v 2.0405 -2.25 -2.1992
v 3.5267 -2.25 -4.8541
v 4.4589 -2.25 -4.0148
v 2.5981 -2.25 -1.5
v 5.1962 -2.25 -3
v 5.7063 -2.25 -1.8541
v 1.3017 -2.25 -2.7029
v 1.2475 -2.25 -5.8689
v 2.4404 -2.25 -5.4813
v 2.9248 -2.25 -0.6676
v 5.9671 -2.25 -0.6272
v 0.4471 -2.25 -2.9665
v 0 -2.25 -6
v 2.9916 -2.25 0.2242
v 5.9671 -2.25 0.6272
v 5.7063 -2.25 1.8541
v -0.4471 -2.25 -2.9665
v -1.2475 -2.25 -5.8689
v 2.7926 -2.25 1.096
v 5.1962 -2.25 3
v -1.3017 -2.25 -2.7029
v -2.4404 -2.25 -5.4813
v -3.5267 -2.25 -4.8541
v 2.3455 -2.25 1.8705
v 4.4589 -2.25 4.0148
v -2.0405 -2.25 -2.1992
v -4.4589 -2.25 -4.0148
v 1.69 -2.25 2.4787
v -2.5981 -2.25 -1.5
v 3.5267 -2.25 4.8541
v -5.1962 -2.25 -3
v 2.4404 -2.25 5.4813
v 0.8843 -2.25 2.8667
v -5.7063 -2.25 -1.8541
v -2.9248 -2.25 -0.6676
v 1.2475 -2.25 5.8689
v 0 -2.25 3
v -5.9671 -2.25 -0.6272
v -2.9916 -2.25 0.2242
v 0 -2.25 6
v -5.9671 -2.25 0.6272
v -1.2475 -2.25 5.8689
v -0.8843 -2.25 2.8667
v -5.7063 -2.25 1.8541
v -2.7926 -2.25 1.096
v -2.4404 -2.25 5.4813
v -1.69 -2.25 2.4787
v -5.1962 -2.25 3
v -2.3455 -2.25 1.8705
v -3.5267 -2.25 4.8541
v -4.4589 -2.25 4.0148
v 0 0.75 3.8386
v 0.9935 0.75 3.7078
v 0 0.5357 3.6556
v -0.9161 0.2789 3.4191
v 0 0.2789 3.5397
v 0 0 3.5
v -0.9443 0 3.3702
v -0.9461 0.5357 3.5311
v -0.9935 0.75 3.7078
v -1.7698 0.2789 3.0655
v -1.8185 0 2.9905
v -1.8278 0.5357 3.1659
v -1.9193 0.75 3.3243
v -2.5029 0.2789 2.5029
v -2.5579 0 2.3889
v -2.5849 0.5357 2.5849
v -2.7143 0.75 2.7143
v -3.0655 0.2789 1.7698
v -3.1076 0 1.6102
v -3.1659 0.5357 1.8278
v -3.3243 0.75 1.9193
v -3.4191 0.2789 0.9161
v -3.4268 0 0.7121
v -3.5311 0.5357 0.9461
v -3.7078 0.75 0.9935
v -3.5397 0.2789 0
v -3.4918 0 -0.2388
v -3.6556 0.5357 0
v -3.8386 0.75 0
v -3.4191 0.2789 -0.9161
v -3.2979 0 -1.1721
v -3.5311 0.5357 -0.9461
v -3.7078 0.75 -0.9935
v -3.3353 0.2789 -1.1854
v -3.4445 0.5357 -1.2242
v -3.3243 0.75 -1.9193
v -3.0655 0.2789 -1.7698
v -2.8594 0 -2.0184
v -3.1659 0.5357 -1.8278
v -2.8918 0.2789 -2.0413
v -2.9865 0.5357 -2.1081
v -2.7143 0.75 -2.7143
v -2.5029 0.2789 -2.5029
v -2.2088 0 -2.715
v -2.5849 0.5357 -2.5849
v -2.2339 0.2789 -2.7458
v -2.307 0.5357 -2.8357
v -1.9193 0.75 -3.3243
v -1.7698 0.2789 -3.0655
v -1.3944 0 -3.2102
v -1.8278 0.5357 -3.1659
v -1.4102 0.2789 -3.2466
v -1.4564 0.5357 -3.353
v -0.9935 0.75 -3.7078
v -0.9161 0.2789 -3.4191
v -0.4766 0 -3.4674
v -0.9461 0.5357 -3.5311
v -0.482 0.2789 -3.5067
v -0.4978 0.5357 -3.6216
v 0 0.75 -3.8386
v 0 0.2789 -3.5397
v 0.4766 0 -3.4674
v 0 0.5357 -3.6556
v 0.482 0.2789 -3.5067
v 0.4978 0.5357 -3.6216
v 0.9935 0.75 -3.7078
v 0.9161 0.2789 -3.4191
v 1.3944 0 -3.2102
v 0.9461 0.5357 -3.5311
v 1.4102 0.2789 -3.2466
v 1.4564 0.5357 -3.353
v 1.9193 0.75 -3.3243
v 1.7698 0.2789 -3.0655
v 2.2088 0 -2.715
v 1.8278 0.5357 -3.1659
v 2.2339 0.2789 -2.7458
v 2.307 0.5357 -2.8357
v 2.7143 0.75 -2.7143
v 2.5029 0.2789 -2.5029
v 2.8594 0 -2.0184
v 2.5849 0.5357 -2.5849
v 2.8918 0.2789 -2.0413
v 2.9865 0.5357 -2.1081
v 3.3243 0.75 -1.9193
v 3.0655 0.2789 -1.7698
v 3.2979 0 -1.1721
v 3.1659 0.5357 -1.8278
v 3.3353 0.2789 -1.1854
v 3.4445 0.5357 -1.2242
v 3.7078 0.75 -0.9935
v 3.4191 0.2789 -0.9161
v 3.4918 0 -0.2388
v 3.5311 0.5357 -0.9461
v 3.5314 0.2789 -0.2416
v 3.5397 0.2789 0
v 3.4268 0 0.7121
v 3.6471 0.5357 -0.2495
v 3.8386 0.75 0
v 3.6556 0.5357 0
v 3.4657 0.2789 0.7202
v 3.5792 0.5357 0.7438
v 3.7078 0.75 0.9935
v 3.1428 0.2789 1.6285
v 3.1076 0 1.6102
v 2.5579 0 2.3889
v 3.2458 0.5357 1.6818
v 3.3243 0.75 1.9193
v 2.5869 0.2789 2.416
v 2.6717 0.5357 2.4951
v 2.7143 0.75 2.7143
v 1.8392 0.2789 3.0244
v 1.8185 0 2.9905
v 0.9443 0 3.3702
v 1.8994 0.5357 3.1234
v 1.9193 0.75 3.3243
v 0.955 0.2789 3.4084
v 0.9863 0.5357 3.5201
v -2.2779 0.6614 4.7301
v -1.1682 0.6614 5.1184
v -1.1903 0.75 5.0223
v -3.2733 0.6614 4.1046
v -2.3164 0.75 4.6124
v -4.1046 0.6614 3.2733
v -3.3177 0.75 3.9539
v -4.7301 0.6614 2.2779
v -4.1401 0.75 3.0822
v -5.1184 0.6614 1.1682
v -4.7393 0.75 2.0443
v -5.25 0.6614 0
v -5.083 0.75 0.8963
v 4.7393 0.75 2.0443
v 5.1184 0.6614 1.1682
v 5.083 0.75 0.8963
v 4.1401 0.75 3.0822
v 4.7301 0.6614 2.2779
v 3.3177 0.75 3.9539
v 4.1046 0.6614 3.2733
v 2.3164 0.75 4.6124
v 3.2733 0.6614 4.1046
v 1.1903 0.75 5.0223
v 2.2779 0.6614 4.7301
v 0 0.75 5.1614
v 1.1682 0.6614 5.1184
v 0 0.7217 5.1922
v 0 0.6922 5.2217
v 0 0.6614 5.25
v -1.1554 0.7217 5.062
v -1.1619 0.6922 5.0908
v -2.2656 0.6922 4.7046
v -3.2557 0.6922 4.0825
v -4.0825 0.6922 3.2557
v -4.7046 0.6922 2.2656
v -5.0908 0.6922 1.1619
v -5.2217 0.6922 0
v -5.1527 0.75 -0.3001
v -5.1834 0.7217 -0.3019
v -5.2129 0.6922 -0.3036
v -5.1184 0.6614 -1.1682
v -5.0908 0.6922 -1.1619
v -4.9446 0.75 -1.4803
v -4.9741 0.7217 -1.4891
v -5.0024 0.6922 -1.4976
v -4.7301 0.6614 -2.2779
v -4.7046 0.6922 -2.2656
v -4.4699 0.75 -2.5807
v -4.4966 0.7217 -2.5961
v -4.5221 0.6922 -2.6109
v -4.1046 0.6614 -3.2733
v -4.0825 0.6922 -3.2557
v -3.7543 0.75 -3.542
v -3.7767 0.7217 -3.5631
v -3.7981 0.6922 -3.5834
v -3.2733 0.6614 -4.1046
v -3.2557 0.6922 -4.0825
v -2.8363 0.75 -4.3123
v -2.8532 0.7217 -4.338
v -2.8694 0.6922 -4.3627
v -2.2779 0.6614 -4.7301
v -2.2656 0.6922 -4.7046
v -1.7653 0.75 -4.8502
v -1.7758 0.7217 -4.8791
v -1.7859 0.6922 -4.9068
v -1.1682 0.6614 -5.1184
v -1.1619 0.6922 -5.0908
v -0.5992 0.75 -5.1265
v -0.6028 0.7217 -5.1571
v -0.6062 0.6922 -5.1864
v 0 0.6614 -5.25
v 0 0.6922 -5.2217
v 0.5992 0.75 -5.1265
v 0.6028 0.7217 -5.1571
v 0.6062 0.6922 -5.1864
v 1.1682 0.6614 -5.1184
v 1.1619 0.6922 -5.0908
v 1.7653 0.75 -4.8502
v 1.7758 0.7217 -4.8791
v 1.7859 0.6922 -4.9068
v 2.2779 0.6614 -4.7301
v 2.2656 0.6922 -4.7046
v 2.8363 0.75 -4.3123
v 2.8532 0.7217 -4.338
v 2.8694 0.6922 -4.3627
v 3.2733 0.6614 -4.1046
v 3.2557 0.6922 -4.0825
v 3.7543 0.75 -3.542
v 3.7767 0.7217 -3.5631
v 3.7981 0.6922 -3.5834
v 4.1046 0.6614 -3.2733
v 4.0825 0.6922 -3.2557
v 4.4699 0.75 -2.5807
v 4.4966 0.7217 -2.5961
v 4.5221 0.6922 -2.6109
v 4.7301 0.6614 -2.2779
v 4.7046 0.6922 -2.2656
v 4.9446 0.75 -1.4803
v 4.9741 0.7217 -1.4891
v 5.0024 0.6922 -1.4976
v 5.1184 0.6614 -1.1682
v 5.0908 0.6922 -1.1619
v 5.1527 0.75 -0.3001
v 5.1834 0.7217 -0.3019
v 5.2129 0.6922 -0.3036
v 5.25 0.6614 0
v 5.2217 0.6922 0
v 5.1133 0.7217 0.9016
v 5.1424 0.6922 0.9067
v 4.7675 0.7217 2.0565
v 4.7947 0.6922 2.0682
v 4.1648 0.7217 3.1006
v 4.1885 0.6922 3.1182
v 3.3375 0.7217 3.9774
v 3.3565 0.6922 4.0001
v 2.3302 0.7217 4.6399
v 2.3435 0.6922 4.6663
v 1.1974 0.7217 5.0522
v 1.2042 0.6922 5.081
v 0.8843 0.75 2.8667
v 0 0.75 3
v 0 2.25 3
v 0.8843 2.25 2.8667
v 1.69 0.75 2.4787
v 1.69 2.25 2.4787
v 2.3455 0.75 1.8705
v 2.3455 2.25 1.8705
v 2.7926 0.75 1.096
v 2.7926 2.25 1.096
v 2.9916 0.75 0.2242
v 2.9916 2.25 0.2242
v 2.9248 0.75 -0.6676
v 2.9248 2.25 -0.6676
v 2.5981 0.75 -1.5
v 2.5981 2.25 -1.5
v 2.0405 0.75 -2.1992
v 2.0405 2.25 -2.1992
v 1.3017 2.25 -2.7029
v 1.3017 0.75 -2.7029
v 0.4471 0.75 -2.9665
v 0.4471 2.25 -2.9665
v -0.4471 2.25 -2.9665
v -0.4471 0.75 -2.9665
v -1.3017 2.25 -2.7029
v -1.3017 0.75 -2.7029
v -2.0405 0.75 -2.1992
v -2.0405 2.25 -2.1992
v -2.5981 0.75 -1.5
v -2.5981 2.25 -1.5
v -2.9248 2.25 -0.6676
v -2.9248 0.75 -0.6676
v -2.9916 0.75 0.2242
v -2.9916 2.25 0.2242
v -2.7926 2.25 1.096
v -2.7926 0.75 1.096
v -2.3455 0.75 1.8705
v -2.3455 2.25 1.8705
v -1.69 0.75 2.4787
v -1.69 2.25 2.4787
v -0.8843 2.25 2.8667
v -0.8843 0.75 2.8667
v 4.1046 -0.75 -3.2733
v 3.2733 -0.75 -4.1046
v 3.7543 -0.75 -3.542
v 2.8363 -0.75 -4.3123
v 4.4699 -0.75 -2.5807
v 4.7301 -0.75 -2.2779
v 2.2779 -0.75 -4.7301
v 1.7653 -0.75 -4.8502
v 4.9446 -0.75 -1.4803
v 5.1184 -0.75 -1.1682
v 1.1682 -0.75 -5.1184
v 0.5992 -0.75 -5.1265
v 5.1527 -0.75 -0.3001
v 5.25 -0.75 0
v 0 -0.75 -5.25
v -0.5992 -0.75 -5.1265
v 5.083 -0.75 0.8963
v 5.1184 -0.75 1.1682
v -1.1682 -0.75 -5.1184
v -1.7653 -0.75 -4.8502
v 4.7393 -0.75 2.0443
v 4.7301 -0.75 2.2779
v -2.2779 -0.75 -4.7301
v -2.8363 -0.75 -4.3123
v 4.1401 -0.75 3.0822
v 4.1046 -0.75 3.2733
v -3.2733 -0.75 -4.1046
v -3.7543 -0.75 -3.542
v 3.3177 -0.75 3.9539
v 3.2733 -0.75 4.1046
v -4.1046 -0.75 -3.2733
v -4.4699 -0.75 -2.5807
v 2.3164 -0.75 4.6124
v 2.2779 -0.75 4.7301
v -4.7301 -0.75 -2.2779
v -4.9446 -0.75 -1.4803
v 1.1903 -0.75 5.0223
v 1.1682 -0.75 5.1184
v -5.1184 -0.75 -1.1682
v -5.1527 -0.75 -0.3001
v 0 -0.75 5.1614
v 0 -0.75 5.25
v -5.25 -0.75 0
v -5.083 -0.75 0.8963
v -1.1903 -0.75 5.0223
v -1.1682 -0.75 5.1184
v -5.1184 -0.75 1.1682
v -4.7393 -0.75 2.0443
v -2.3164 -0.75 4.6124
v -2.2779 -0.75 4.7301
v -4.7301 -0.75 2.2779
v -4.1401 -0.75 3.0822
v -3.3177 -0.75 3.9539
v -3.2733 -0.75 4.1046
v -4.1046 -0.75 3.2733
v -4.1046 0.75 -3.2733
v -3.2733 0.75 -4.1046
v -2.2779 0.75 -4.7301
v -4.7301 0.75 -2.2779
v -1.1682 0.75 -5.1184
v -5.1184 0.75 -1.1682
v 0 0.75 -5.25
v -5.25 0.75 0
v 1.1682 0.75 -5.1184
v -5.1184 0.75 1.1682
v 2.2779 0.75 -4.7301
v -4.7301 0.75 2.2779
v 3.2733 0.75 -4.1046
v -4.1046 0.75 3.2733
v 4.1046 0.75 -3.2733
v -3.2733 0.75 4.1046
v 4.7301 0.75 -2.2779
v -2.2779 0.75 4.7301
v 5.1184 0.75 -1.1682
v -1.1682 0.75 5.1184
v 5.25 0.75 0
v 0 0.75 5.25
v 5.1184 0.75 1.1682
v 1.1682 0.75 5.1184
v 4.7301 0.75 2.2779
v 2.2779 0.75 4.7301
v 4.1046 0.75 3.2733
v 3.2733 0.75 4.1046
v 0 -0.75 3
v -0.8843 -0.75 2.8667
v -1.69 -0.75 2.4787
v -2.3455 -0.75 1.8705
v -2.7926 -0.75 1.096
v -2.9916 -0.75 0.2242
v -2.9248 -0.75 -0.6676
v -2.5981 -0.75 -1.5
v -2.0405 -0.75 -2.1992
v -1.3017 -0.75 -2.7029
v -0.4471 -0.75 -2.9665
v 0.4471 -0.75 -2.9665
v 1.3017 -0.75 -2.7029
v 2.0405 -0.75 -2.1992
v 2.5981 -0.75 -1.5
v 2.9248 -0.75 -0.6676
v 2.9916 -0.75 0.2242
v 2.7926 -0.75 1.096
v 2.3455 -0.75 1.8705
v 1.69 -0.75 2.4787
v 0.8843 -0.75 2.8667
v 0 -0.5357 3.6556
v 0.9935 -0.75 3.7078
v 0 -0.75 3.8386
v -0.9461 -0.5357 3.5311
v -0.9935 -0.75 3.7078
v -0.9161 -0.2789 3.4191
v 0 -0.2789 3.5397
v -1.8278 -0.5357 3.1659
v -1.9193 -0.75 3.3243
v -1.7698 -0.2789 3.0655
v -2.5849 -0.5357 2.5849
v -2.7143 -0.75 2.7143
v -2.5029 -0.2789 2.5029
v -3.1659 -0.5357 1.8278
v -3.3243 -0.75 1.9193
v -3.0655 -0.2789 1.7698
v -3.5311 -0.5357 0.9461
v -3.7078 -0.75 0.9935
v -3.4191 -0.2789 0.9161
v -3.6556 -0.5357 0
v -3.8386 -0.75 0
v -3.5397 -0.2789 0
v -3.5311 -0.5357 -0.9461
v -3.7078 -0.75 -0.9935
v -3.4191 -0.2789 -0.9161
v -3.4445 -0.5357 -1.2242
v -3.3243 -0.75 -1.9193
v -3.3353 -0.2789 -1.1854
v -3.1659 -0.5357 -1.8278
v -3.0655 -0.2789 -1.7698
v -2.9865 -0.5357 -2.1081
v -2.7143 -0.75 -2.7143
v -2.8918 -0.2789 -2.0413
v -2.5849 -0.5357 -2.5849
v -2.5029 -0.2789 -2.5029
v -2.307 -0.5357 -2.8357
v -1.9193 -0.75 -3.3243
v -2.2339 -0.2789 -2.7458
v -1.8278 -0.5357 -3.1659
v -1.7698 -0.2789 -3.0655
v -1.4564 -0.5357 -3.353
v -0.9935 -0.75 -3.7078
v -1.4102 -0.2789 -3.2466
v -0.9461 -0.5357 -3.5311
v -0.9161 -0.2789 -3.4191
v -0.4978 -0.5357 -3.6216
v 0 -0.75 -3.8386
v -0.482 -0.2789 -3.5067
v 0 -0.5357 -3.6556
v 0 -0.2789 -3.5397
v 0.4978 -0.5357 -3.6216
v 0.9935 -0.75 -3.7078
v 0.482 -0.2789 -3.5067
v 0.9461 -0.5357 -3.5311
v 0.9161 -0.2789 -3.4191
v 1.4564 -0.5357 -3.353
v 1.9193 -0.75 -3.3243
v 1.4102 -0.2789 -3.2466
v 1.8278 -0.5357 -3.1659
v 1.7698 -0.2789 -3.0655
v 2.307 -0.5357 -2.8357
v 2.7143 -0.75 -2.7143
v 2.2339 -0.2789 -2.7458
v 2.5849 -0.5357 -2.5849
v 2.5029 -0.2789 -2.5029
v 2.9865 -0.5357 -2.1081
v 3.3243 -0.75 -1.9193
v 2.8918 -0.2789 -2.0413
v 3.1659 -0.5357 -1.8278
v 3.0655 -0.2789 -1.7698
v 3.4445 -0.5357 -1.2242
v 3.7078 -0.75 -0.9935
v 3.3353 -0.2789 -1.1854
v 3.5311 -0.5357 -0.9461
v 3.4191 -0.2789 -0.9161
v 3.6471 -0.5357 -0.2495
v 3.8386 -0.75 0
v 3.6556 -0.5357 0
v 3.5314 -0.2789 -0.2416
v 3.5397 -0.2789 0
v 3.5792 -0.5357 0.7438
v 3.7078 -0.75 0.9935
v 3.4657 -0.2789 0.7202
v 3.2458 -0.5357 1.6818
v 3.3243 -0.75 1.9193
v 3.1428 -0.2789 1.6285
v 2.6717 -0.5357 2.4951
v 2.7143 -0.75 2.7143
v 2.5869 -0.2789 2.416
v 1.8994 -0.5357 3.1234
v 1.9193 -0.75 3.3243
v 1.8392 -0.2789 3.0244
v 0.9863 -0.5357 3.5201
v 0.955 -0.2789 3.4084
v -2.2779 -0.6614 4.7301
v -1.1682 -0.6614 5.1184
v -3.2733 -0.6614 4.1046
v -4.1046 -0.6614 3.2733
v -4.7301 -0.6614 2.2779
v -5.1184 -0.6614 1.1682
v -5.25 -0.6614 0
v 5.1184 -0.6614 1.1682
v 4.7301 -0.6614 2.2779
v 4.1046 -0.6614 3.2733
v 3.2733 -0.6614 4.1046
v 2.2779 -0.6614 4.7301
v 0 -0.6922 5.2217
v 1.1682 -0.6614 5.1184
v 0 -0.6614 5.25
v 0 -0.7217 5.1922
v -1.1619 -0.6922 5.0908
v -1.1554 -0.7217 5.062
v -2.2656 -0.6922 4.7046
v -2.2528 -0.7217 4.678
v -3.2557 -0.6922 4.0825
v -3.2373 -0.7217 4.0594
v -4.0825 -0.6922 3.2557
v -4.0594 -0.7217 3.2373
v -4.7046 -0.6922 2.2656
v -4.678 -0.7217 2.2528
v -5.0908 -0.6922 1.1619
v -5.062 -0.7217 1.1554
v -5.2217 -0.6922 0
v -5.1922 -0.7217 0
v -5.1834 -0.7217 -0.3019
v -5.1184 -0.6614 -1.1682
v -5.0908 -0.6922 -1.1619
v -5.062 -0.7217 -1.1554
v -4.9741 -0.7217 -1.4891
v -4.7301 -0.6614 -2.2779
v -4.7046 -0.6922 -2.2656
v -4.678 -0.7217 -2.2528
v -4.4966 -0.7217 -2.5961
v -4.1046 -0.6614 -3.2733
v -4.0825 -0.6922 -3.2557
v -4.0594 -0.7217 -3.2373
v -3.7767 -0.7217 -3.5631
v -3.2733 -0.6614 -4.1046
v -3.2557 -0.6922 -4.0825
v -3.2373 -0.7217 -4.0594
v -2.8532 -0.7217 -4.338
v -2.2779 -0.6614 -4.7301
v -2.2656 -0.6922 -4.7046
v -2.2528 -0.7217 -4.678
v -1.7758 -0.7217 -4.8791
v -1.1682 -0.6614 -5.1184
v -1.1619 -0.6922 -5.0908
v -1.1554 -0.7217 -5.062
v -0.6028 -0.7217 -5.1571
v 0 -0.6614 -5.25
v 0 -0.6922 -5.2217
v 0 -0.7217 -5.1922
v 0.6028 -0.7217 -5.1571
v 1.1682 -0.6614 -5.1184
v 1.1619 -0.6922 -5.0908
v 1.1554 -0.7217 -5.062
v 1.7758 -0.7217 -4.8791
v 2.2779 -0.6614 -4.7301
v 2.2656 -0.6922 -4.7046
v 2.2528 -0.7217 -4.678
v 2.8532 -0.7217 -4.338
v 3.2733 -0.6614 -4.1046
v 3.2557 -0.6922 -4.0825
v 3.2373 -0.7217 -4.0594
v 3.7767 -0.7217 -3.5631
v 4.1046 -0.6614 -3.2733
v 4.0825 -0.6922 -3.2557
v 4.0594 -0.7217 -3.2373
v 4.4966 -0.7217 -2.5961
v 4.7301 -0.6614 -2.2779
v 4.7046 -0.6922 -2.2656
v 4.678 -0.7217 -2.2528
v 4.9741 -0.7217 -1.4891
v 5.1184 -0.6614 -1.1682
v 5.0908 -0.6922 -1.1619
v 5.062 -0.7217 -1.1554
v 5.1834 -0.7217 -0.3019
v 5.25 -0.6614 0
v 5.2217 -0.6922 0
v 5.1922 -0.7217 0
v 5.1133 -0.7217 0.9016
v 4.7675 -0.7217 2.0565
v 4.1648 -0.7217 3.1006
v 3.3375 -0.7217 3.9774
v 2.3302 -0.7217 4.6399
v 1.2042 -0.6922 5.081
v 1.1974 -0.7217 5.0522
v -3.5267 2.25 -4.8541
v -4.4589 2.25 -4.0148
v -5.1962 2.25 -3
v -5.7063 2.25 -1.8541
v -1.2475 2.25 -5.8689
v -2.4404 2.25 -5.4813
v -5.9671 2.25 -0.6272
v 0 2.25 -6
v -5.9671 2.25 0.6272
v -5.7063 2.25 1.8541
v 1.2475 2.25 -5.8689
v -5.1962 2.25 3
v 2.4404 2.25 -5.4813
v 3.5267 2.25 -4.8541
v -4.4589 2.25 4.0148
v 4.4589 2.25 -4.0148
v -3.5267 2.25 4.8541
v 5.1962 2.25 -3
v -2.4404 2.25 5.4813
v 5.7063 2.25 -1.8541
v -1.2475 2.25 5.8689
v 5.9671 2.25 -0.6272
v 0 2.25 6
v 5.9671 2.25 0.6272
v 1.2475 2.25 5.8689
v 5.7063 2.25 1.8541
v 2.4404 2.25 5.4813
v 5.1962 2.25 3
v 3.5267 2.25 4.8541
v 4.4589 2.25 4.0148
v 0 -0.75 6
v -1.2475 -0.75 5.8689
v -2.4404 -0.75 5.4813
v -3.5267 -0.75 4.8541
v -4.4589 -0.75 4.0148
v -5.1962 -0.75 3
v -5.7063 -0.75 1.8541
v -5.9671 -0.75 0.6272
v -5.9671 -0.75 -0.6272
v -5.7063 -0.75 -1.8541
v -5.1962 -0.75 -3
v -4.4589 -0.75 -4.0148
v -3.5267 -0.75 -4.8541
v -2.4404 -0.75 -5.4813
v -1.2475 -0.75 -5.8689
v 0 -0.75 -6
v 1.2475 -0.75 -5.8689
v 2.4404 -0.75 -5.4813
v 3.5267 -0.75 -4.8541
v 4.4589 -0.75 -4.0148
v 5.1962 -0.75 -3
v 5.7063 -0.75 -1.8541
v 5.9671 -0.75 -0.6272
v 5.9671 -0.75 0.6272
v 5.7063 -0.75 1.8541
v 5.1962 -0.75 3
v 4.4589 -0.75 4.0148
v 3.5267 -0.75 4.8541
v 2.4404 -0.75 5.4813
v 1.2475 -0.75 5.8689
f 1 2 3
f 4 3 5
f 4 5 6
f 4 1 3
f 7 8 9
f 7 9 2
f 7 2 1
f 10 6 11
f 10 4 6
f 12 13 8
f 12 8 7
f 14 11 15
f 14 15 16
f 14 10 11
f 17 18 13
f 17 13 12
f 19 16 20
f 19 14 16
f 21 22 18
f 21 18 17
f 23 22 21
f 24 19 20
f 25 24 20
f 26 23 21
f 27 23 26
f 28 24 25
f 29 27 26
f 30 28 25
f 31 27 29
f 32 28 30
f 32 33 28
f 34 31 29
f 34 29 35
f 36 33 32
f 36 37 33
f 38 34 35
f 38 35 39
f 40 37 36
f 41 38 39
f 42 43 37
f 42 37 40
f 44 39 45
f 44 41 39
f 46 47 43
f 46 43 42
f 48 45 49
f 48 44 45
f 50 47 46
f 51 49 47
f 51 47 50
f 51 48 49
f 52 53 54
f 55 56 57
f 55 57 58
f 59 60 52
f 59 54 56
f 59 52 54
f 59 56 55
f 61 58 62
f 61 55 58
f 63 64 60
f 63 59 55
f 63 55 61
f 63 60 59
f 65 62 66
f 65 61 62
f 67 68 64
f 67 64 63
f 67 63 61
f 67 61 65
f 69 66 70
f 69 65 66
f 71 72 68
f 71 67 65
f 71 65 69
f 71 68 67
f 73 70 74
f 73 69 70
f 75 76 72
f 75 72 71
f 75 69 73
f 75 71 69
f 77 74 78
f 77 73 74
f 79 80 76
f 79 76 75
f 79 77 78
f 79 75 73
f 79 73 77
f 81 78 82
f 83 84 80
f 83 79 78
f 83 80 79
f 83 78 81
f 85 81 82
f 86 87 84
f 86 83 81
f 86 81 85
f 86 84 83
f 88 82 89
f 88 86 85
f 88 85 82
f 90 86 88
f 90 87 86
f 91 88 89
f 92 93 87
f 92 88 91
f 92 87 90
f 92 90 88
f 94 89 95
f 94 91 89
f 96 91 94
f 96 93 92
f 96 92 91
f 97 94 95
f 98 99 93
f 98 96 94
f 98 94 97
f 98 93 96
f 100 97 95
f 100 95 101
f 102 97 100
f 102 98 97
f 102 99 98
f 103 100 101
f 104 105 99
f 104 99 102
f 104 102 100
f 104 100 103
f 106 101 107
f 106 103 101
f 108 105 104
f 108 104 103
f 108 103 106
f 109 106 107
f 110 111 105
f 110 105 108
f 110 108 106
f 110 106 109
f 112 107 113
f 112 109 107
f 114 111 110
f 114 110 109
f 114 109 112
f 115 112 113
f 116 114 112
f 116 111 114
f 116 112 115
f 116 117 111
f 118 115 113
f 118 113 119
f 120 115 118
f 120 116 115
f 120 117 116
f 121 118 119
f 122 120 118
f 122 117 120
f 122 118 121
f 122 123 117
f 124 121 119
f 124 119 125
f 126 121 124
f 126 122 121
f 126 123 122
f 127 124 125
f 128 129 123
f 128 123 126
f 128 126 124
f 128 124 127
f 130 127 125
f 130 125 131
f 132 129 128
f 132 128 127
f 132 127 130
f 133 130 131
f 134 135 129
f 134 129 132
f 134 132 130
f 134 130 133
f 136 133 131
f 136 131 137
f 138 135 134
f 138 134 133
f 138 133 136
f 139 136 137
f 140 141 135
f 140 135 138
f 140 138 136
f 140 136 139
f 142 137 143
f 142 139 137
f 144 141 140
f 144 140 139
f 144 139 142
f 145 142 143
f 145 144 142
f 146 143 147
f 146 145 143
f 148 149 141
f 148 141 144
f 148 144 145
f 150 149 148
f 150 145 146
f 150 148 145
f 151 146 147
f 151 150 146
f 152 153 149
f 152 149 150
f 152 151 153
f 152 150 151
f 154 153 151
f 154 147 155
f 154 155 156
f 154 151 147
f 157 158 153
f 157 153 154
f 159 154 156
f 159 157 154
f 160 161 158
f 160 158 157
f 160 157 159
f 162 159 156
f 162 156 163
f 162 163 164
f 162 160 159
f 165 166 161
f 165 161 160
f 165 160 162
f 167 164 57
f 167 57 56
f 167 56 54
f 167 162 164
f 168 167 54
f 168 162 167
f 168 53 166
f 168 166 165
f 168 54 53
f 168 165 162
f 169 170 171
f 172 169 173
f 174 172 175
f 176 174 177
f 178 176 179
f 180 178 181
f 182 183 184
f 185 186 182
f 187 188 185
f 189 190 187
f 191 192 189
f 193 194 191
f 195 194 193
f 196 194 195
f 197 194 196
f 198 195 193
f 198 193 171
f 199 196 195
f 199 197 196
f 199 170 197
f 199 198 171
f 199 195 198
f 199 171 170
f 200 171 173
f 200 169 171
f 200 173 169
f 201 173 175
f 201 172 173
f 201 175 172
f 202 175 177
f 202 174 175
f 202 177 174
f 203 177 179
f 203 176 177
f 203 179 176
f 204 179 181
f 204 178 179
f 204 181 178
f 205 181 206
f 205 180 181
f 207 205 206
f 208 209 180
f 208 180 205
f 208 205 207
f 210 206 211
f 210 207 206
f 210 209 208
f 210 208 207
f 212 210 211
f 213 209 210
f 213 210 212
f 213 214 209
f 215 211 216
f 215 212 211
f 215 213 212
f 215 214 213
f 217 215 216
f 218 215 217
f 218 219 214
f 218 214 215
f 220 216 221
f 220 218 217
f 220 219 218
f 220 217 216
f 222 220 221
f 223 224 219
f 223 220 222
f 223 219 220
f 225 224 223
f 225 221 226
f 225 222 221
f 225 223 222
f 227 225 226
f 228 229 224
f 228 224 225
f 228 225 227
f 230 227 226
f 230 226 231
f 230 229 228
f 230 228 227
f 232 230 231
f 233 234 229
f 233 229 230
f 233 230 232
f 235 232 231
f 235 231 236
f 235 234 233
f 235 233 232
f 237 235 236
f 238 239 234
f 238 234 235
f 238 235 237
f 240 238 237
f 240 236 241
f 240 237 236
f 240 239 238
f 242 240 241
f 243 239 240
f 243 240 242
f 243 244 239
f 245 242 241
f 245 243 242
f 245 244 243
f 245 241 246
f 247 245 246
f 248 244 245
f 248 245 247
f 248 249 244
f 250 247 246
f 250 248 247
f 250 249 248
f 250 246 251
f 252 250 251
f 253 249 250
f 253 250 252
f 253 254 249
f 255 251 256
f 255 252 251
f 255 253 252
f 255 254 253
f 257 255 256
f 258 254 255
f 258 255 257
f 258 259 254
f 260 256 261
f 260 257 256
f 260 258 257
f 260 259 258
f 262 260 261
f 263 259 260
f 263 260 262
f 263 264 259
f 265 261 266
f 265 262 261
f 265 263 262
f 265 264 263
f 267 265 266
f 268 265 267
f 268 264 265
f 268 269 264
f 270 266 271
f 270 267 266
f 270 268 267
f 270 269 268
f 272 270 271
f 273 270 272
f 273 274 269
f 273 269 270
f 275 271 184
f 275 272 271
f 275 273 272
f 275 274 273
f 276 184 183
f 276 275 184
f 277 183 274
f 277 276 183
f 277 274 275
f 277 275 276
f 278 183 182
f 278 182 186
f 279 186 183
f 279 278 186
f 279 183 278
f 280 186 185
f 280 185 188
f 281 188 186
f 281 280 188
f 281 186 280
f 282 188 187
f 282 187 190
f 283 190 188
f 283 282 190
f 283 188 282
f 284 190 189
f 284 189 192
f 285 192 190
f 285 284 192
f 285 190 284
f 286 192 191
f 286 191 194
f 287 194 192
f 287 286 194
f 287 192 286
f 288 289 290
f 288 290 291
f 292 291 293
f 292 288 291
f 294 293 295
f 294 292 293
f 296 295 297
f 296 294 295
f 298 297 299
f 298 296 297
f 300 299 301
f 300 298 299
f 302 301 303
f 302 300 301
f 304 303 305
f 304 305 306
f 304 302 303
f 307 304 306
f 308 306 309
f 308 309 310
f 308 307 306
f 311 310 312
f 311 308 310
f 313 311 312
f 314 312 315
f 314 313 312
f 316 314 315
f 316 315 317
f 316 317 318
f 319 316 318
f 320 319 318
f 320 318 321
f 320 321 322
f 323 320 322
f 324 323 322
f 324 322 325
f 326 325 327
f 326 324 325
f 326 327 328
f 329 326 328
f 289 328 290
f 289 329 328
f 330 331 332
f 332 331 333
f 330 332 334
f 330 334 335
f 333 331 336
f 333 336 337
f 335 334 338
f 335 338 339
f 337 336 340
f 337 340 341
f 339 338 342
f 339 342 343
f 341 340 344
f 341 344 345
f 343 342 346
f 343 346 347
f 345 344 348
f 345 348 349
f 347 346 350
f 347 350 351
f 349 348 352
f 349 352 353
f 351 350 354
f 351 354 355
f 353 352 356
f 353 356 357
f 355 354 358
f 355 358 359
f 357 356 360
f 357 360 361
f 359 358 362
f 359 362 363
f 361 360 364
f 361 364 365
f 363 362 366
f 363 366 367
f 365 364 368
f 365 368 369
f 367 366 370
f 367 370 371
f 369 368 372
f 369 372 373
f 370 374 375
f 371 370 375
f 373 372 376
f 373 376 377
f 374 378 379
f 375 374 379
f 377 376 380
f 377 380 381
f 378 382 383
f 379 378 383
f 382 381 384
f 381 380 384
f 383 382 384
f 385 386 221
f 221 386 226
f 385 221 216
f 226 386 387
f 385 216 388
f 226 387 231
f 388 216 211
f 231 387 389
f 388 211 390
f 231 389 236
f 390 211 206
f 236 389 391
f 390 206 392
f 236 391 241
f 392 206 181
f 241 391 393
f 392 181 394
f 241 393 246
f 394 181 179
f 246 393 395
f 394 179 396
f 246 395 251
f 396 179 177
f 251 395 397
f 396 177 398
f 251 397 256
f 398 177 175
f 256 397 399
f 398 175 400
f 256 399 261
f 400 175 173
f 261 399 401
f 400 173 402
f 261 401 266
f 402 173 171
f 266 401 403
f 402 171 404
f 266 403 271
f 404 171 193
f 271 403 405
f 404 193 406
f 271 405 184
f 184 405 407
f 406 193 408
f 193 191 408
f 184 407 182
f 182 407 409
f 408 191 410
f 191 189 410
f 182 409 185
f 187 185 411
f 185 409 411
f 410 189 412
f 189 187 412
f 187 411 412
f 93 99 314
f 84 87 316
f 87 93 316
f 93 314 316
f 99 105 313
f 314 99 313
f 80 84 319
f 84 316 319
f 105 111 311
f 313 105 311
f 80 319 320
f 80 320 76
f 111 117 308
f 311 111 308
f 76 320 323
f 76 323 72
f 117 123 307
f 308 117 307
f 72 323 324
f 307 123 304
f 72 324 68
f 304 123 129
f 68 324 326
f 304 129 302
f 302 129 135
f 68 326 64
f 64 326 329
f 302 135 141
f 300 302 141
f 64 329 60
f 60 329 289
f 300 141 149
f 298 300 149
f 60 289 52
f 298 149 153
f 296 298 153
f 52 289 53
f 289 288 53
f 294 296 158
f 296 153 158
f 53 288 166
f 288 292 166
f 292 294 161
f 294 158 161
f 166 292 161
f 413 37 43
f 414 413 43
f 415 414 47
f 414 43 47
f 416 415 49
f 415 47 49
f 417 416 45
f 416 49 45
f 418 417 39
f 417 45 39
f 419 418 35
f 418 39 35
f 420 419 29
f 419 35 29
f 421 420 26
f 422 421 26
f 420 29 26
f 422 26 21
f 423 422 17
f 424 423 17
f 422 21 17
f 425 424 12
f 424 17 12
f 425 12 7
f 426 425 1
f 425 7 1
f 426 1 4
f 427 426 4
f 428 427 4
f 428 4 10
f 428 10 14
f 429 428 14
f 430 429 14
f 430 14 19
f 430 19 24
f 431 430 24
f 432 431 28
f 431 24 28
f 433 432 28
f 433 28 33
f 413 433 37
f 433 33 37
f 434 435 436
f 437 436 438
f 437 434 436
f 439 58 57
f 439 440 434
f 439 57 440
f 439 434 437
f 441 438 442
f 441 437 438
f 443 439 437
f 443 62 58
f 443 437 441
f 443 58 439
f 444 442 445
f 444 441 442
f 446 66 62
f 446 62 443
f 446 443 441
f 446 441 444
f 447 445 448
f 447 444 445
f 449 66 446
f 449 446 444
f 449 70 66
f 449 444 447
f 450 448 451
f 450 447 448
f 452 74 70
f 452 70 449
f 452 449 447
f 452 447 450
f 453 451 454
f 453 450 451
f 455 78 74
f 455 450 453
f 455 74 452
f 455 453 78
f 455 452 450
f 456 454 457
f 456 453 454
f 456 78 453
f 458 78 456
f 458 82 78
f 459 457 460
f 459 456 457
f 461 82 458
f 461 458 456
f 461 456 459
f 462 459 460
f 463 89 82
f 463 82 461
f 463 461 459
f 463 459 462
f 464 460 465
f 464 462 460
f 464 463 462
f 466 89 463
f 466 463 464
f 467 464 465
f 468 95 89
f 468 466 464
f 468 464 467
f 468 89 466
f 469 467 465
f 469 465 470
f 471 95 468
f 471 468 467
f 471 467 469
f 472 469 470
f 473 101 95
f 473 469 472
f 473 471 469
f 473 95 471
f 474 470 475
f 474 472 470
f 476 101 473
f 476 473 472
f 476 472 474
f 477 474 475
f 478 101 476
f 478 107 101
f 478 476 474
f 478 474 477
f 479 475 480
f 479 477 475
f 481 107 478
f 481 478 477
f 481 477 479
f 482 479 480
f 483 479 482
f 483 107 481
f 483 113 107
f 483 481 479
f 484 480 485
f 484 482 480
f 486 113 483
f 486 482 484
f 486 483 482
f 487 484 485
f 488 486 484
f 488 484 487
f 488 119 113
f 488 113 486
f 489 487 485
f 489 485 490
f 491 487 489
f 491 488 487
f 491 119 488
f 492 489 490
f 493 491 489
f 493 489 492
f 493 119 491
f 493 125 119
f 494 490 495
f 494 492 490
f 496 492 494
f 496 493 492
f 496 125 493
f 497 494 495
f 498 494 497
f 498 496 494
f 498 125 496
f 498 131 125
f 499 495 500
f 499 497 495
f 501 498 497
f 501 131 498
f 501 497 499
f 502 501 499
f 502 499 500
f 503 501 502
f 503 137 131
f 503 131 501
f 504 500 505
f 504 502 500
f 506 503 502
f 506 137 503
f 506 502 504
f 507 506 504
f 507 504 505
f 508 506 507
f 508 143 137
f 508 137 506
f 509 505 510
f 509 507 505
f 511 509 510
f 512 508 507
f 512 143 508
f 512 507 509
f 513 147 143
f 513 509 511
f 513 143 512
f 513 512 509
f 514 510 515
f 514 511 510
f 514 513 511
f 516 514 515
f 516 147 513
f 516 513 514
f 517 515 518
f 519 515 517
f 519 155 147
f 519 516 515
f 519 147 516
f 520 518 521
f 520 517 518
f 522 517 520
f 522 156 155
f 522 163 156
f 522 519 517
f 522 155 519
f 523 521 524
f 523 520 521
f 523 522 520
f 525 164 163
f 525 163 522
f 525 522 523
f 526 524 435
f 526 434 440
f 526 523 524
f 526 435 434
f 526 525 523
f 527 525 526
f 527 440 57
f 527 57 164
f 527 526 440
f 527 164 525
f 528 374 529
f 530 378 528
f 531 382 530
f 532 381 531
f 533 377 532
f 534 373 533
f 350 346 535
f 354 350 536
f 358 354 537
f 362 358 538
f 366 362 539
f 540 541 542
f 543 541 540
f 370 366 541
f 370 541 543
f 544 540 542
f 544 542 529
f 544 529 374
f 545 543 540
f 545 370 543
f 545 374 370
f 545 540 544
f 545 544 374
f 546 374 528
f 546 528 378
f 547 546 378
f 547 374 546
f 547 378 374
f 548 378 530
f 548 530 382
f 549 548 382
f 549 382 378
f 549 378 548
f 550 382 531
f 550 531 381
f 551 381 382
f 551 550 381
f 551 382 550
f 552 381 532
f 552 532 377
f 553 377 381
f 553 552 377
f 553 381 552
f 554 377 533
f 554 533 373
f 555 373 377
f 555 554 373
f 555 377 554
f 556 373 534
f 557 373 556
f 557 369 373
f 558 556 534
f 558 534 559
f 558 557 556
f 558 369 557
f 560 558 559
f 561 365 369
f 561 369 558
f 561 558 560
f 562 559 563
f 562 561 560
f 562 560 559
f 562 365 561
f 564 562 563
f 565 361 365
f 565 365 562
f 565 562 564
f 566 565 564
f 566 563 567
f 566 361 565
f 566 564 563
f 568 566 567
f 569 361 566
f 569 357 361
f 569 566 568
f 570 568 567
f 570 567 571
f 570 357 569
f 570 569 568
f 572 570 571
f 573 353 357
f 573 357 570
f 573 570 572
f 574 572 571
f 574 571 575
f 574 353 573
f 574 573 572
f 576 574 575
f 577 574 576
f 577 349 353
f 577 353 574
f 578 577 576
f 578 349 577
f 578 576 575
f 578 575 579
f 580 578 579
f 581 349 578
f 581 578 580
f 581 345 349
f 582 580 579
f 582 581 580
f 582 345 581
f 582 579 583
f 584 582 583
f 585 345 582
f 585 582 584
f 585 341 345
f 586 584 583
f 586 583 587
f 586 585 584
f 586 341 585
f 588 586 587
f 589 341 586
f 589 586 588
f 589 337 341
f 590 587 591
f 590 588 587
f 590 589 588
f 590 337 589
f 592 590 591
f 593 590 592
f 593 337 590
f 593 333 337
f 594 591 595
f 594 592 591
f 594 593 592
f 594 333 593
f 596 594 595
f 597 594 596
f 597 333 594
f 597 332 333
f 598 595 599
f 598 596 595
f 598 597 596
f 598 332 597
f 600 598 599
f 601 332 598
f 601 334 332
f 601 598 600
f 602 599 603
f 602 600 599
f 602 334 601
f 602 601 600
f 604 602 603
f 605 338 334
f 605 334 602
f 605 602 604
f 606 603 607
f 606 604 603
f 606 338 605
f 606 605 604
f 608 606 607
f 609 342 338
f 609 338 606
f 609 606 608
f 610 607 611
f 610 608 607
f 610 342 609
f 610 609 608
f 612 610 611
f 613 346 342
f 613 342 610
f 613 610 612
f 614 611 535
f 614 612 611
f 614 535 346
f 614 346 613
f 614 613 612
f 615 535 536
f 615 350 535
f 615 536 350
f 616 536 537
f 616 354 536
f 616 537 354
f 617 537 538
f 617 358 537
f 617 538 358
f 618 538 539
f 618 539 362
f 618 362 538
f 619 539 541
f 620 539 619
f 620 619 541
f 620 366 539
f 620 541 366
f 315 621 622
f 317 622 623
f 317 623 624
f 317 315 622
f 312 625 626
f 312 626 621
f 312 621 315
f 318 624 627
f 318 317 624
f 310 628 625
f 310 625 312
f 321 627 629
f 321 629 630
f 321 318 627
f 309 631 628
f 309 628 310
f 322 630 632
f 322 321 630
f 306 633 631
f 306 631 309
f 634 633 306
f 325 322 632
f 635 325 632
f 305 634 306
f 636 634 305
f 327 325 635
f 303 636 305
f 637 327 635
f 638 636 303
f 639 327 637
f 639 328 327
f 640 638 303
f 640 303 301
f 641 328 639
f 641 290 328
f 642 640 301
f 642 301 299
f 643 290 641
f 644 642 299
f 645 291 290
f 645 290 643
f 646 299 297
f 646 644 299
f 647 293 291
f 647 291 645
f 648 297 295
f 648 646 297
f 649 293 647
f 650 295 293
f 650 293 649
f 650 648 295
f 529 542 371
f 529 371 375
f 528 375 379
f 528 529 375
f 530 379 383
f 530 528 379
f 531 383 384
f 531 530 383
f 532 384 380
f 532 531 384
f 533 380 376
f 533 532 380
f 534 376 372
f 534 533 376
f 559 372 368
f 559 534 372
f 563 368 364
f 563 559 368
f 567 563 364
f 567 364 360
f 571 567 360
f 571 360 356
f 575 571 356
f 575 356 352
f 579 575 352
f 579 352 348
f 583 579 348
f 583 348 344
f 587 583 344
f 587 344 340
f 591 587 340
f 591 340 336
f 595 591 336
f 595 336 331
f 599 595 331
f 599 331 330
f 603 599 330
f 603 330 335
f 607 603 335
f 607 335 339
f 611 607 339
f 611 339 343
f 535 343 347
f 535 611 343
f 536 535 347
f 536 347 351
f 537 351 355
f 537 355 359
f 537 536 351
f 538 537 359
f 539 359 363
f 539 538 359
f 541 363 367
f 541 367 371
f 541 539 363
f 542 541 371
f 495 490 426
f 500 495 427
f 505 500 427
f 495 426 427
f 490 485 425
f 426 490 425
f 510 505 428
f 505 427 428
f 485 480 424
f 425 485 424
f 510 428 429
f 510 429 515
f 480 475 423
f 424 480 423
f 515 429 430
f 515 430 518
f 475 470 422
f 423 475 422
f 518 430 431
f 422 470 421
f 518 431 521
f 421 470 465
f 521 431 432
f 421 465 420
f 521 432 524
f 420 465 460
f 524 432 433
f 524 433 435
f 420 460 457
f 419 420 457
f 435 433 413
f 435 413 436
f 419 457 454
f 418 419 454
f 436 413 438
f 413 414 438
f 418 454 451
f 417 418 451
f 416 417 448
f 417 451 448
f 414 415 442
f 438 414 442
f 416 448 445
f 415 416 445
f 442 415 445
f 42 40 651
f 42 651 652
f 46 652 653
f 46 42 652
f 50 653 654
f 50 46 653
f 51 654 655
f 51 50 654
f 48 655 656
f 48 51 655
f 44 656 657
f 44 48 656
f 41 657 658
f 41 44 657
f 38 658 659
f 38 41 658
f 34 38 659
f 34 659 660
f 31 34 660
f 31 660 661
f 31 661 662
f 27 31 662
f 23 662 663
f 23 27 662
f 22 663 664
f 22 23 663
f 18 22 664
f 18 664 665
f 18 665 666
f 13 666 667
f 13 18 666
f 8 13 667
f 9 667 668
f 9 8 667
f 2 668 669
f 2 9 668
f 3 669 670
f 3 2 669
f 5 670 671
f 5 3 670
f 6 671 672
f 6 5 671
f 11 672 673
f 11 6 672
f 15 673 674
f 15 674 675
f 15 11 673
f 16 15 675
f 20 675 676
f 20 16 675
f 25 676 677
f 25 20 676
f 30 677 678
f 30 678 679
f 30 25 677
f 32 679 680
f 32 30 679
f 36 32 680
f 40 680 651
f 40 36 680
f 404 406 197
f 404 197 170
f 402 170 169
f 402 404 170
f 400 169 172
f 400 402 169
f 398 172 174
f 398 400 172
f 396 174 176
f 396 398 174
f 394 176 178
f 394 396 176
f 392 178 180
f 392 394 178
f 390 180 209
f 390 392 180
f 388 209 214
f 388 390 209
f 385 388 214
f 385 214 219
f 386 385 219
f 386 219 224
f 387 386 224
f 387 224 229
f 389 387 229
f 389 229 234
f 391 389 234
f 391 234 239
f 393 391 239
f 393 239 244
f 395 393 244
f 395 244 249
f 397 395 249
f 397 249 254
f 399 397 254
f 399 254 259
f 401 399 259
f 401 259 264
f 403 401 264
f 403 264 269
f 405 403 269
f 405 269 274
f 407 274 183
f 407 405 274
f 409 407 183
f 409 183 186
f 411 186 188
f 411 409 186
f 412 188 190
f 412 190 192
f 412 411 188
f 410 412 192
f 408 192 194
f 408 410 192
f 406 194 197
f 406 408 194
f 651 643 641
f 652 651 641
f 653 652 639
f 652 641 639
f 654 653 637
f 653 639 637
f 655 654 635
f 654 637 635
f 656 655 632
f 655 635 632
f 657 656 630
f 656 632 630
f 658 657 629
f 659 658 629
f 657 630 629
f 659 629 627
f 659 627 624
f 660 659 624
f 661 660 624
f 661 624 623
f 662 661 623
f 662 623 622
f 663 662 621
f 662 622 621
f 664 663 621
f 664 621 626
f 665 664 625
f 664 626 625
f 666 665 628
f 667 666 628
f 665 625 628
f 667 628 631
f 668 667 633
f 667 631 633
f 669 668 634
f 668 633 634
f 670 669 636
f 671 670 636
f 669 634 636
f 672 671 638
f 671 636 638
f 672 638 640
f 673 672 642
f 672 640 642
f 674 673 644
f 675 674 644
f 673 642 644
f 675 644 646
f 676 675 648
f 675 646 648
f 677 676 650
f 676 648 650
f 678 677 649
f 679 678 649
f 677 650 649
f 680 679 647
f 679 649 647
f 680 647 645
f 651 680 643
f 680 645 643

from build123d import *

# Parameters (mm, degrees)
SKETCH_3_R      = 1
SKETCH_5_R      = 6
SKETCH_5_R_2    = 3
EXTRUDE_1_DEPTH = 1.5
SKETCH_6_R      = 6
SKETCH_6_R_2    = 5.25
EXTRUDE_3_DEPTH = 1.5
EXTRUDE_START   = 1.5
SKETCH_7_R      = 6
SKETCH_7_R_2    = 3
EXTRUDE_4_DEPTH = 1.5


with BuildPart() as part:
    # ｽｹｯﾁ3 → 回転3 (revolve)
    with BuildSketch(Plane(origin=(0, 0, 0), x_dir=(0, 0, -1), z_dir=(1, 0, 0))):
        with Locations((-4.5, 0)):
            Circle(SKETCH_3_R)
    revolve(axis=Axis((0, 7.993421053, 0), (0, -1, 0)))



with BuildPart() as body_2:
    # ｽｹｯﾁ5 → ﾎﾞｽ - 押し出し1 (new body)
    with BuildSketch(Plane(origin=(0, 0.75, 0), x_dir=(1, 0, 0), z_dir=(0, 1, 0))):
        with Locations(Location((0, 0, 0), (0, 0, 270))):
            Circle(SKETCH_5_R)
        with Locations(Location((0, 0, 0), (0, 0, 270))):
            Circle(SKETCH_5_R_2, mode=Mode.SUBTRACT)
    extrude(amount=EXTRUDE_1_DEPTH)


with BuildPart() as part_1:
    add(part.part)

    add(body_2.part)  # ﾎﾞｽ - 押し出し3 merges body 2
    # ｽｹｯﾁ6 → ﾎﾞｽ - 押し出し3 (add)
    with BuildSketch(Plane.XZ.offset(-0.75)):
        with Locations(Location((0, 0, 0), (0, 0, 90))):
            Circle(SKETCH_6_R)
        with Locations(Location((0, 0, 0), (0, 0, 90))):
            Circle(SKETCH_6_R_2, mode=Mode.SUBTRACT)
    extrude(amount=EXTRUDE_3_DEPTH)

    # ｽｹｯﾁ7 → ﾎﾞｽ - 押し出し4 (add)
    with BuildSketch(Plane.XZ.offset(0.75).offset(EXTRUDE_START)):
        with Locations(Location((0, 0, 0), (0, 0, 90))):
            Circle(SKETCH_7_R)
        with Locations(Location((0, 0, 0), (0, 0, 90))):
            Circle(SKETCH_7_R_2, mode=Mode.SUBTRACT)
    extrude(amount=-EXTRUDE_4_DEPTH)


solid = part_1.part
